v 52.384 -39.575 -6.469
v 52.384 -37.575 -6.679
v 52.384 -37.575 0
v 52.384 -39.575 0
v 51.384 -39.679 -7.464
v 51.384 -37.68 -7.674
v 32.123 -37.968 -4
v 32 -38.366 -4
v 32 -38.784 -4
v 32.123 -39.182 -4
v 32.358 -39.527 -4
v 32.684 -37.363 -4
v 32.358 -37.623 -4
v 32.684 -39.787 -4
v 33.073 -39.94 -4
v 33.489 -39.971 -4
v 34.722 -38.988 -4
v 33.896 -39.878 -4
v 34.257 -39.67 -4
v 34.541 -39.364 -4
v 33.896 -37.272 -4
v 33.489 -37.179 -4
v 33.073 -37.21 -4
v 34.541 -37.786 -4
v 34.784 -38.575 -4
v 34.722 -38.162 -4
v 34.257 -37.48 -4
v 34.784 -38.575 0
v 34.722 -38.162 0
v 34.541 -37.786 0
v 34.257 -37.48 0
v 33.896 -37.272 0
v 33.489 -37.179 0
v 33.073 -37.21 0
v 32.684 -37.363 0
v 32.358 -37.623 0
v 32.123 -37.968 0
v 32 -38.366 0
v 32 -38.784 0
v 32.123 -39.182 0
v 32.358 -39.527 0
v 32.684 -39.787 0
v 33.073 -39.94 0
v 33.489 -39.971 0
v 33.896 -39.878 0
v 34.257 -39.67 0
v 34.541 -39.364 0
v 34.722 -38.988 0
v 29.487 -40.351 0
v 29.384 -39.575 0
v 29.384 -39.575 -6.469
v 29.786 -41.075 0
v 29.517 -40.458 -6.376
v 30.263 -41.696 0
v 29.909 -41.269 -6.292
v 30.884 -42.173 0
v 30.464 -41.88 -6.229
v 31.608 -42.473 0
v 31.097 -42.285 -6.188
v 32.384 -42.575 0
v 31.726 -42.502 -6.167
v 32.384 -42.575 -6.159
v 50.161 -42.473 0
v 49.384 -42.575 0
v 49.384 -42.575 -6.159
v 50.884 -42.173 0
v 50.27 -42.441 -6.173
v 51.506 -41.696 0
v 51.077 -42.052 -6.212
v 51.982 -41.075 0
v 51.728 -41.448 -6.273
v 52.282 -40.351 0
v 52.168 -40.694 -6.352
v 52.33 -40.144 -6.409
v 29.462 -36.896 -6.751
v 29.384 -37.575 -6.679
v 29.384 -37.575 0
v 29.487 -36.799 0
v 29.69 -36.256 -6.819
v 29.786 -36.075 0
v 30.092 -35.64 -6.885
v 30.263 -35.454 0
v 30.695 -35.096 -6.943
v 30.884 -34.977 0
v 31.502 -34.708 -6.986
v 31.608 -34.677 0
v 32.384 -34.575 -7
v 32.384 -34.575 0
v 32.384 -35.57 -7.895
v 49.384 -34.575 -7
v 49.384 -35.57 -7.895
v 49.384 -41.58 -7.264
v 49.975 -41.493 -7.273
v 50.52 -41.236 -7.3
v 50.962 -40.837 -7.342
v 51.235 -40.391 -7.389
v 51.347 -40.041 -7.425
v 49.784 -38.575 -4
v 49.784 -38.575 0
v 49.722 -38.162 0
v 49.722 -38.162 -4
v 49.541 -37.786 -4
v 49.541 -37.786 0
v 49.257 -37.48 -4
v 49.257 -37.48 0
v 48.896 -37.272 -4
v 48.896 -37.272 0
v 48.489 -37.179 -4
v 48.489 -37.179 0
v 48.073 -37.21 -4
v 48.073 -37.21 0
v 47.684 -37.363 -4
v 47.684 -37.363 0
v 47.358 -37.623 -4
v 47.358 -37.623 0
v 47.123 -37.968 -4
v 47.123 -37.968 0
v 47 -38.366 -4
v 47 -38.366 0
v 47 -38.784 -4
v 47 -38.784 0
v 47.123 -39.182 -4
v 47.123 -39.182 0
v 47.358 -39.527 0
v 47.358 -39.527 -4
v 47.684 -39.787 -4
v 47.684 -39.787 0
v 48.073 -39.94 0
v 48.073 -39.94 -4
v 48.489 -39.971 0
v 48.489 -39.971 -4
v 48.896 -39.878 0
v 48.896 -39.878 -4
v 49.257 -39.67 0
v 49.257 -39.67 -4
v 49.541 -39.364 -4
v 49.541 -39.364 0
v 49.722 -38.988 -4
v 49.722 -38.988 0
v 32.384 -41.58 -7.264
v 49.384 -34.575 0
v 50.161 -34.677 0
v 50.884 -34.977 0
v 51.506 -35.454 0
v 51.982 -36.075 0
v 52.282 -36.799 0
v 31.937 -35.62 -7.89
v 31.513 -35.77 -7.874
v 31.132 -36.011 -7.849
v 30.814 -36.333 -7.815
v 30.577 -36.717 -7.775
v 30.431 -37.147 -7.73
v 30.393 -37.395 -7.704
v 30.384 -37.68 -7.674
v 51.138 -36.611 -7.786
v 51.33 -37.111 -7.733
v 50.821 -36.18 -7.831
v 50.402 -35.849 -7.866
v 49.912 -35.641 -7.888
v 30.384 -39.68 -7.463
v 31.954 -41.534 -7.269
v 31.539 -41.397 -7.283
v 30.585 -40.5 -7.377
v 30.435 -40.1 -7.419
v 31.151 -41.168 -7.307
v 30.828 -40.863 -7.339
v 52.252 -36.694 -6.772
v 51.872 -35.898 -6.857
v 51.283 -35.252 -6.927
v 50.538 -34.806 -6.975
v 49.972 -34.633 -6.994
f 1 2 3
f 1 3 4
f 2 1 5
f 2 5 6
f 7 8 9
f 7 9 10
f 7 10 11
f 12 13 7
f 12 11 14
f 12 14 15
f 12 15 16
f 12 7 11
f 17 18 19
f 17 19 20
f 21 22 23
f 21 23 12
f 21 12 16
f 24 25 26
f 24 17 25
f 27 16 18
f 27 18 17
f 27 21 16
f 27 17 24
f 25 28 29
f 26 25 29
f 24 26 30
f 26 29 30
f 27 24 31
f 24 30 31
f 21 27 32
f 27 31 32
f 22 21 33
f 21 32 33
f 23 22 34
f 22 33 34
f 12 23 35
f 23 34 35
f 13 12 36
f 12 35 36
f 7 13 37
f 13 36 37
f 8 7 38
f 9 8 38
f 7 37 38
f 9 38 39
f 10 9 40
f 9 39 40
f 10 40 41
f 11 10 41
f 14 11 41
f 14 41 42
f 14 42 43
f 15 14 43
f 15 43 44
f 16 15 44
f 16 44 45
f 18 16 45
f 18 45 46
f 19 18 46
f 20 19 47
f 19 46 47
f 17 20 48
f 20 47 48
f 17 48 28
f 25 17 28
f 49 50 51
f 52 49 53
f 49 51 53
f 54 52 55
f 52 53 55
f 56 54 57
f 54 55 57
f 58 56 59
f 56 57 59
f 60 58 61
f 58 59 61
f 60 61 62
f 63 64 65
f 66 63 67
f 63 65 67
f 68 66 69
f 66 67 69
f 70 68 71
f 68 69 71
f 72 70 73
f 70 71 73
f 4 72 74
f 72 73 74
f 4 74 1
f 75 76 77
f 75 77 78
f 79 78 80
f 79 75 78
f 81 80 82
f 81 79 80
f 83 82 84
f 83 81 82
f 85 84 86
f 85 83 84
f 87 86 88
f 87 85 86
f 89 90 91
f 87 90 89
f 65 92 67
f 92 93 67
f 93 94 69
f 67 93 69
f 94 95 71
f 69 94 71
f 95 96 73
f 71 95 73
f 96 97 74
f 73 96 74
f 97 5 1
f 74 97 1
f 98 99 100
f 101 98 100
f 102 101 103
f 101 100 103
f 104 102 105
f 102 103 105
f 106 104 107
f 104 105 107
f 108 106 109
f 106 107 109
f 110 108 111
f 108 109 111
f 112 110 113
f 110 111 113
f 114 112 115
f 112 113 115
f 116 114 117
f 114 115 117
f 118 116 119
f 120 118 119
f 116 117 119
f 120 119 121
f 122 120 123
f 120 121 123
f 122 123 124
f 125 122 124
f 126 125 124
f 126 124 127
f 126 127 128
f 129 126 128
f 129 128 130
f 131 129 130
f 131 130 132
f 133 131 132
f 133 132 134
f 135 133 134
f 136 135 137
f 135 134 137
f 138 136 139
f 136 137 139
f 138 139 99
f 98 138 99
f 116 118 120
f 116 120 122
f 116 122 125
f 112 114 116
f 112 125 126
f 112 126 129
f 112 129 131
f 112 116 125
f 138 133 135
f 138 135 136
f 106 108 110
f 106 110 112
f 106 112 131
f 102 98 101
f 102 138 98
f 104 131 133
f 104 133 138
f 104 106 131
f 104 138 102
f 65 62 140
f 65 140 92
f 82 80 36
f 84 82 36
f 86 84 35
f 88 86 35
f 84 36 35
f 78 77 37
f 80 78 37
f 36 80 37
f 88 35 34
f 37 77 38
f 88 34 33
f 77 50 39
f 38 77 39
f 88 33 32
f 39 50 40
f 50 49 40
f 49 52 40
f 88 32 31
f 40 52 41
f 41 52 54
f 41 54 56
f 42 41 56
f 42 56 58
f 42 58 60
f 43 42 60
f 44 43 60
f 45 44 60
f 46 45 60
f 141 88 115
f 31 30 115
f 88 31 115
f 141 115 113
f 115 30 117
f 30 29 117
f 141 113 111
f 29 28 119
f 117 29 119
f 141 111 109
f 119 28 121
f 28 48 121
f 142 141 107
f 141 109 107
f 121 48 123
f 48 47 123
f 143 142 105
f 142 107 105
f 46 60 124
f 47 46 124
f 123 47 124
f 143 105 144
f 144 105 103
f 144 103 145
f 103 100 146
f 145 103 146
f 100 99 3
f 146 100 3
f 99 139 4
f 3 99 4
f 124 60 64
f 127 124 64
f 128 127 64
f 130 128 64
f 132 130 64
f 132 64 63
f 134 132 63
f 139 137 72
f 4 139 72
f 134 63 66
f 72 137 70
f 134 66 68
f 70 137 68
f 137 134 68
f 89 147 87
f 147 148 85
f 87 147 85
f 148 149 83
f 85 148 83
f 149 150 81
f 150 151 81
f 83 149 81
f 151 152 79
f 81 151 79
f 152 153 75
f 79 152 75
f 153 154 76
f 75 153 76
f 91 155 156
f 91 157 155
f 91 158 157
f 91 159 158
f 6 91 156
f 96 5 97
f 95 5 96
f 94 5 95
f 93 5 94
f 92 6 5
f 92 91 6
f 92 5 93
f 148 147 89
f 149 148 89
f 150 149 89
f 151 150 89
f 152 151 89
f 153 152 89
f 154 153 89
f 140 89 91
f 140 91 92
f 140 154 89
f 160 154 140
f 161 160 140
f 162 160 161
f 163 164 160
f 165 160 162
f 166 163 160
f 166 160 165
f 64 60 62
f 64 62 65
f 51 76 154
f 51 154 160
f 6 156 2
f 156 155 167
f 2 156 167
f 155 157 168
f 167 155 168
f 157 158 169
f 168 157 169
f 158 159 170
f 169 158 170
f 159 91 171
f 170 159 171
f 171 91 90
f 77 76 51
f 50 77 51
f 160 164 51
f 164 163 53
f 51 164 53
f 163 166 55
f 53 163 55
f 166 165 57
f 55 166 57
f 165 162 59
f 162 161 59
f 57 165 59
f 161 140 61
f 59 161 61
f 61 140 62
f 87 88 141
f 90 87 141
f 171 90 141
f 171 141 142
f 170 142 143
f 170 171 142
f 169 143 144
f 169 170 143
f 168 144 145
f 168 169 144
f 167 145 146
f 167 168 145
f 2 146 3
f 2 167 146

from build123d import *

# Parameters (mm, degrees)
SKETCH014_W     = 23
SKETCH014_H     = 8
PAD005_DEPTH    = 8
SKETCH015_R     = 1.4
POCKET011_DEPTH = 4
POCKET012_DEPTH = 23.001
FILLET002_R     = 3
CHAMFER_SIZE    = 1


with BuildPart() as part:
    # Sketch014 (on ShapeBinder) → Pad005 (new body)
    with BuildSketch(Plane(origin=(0, 0, 0), x_dir=(1, 0, 0), z_dir=(0, 0, -1))):
        with Locations((40.884375, 38.575)):
            Rectangle(SKETCH014_W, SKETCH014_H)
    extrude(amount=PAD005_DEPTH)

    # Sketch015 (on Face5 of Pad005) → Pocket011 (cut)
    with BuildSketch(Plane.XY):
        with Locations((33.384375, -38.575)):
            Circle(SKETCH015_R)
        with Locations((48.384375, -38.575)):
            Circle(SKETCH015_R)
    extrude(amount=-POCKET011_DEPTH, mode=Mode.SUBTRACT)

    # Sketch016 (on Face2 of Pocket011) → Pocket012 (cut, through all)
    with BuildSketch(Plane(origin=(29.384375, 0, 0), x_dir=(0, -1, 0), z_dir=(-1, 0, 0))):
        Polygon((34.575, -8), (42.575, -7.159166), (42.575, -8), align=None)
    extrude(amount=-POCKET012_DEPTH, mode=Mode.SUBTRACT)

    # Fillet002
    fillet002_edges = [part.edges().sort_by_distance(p)[0] for p in [
        (29.384375, -34.575, -4),
        (52.384375, -34.575, -4),
        (52.384375, -42.575, -3.579583),
        (29.384375, -42.575, -3.579583),
    ]]
    fillet(fillet002_edges, radius=FILLET002_R)

    # Chamfer
    chamfer_edges = [part.edges().sort_by_distance(p)[0] for p in [
        (40.884375, -42.575, -7.159166),
    ]]
    chamfer(chamfer_edges, length=CHAMFER_SIZE)


solid = part.part
